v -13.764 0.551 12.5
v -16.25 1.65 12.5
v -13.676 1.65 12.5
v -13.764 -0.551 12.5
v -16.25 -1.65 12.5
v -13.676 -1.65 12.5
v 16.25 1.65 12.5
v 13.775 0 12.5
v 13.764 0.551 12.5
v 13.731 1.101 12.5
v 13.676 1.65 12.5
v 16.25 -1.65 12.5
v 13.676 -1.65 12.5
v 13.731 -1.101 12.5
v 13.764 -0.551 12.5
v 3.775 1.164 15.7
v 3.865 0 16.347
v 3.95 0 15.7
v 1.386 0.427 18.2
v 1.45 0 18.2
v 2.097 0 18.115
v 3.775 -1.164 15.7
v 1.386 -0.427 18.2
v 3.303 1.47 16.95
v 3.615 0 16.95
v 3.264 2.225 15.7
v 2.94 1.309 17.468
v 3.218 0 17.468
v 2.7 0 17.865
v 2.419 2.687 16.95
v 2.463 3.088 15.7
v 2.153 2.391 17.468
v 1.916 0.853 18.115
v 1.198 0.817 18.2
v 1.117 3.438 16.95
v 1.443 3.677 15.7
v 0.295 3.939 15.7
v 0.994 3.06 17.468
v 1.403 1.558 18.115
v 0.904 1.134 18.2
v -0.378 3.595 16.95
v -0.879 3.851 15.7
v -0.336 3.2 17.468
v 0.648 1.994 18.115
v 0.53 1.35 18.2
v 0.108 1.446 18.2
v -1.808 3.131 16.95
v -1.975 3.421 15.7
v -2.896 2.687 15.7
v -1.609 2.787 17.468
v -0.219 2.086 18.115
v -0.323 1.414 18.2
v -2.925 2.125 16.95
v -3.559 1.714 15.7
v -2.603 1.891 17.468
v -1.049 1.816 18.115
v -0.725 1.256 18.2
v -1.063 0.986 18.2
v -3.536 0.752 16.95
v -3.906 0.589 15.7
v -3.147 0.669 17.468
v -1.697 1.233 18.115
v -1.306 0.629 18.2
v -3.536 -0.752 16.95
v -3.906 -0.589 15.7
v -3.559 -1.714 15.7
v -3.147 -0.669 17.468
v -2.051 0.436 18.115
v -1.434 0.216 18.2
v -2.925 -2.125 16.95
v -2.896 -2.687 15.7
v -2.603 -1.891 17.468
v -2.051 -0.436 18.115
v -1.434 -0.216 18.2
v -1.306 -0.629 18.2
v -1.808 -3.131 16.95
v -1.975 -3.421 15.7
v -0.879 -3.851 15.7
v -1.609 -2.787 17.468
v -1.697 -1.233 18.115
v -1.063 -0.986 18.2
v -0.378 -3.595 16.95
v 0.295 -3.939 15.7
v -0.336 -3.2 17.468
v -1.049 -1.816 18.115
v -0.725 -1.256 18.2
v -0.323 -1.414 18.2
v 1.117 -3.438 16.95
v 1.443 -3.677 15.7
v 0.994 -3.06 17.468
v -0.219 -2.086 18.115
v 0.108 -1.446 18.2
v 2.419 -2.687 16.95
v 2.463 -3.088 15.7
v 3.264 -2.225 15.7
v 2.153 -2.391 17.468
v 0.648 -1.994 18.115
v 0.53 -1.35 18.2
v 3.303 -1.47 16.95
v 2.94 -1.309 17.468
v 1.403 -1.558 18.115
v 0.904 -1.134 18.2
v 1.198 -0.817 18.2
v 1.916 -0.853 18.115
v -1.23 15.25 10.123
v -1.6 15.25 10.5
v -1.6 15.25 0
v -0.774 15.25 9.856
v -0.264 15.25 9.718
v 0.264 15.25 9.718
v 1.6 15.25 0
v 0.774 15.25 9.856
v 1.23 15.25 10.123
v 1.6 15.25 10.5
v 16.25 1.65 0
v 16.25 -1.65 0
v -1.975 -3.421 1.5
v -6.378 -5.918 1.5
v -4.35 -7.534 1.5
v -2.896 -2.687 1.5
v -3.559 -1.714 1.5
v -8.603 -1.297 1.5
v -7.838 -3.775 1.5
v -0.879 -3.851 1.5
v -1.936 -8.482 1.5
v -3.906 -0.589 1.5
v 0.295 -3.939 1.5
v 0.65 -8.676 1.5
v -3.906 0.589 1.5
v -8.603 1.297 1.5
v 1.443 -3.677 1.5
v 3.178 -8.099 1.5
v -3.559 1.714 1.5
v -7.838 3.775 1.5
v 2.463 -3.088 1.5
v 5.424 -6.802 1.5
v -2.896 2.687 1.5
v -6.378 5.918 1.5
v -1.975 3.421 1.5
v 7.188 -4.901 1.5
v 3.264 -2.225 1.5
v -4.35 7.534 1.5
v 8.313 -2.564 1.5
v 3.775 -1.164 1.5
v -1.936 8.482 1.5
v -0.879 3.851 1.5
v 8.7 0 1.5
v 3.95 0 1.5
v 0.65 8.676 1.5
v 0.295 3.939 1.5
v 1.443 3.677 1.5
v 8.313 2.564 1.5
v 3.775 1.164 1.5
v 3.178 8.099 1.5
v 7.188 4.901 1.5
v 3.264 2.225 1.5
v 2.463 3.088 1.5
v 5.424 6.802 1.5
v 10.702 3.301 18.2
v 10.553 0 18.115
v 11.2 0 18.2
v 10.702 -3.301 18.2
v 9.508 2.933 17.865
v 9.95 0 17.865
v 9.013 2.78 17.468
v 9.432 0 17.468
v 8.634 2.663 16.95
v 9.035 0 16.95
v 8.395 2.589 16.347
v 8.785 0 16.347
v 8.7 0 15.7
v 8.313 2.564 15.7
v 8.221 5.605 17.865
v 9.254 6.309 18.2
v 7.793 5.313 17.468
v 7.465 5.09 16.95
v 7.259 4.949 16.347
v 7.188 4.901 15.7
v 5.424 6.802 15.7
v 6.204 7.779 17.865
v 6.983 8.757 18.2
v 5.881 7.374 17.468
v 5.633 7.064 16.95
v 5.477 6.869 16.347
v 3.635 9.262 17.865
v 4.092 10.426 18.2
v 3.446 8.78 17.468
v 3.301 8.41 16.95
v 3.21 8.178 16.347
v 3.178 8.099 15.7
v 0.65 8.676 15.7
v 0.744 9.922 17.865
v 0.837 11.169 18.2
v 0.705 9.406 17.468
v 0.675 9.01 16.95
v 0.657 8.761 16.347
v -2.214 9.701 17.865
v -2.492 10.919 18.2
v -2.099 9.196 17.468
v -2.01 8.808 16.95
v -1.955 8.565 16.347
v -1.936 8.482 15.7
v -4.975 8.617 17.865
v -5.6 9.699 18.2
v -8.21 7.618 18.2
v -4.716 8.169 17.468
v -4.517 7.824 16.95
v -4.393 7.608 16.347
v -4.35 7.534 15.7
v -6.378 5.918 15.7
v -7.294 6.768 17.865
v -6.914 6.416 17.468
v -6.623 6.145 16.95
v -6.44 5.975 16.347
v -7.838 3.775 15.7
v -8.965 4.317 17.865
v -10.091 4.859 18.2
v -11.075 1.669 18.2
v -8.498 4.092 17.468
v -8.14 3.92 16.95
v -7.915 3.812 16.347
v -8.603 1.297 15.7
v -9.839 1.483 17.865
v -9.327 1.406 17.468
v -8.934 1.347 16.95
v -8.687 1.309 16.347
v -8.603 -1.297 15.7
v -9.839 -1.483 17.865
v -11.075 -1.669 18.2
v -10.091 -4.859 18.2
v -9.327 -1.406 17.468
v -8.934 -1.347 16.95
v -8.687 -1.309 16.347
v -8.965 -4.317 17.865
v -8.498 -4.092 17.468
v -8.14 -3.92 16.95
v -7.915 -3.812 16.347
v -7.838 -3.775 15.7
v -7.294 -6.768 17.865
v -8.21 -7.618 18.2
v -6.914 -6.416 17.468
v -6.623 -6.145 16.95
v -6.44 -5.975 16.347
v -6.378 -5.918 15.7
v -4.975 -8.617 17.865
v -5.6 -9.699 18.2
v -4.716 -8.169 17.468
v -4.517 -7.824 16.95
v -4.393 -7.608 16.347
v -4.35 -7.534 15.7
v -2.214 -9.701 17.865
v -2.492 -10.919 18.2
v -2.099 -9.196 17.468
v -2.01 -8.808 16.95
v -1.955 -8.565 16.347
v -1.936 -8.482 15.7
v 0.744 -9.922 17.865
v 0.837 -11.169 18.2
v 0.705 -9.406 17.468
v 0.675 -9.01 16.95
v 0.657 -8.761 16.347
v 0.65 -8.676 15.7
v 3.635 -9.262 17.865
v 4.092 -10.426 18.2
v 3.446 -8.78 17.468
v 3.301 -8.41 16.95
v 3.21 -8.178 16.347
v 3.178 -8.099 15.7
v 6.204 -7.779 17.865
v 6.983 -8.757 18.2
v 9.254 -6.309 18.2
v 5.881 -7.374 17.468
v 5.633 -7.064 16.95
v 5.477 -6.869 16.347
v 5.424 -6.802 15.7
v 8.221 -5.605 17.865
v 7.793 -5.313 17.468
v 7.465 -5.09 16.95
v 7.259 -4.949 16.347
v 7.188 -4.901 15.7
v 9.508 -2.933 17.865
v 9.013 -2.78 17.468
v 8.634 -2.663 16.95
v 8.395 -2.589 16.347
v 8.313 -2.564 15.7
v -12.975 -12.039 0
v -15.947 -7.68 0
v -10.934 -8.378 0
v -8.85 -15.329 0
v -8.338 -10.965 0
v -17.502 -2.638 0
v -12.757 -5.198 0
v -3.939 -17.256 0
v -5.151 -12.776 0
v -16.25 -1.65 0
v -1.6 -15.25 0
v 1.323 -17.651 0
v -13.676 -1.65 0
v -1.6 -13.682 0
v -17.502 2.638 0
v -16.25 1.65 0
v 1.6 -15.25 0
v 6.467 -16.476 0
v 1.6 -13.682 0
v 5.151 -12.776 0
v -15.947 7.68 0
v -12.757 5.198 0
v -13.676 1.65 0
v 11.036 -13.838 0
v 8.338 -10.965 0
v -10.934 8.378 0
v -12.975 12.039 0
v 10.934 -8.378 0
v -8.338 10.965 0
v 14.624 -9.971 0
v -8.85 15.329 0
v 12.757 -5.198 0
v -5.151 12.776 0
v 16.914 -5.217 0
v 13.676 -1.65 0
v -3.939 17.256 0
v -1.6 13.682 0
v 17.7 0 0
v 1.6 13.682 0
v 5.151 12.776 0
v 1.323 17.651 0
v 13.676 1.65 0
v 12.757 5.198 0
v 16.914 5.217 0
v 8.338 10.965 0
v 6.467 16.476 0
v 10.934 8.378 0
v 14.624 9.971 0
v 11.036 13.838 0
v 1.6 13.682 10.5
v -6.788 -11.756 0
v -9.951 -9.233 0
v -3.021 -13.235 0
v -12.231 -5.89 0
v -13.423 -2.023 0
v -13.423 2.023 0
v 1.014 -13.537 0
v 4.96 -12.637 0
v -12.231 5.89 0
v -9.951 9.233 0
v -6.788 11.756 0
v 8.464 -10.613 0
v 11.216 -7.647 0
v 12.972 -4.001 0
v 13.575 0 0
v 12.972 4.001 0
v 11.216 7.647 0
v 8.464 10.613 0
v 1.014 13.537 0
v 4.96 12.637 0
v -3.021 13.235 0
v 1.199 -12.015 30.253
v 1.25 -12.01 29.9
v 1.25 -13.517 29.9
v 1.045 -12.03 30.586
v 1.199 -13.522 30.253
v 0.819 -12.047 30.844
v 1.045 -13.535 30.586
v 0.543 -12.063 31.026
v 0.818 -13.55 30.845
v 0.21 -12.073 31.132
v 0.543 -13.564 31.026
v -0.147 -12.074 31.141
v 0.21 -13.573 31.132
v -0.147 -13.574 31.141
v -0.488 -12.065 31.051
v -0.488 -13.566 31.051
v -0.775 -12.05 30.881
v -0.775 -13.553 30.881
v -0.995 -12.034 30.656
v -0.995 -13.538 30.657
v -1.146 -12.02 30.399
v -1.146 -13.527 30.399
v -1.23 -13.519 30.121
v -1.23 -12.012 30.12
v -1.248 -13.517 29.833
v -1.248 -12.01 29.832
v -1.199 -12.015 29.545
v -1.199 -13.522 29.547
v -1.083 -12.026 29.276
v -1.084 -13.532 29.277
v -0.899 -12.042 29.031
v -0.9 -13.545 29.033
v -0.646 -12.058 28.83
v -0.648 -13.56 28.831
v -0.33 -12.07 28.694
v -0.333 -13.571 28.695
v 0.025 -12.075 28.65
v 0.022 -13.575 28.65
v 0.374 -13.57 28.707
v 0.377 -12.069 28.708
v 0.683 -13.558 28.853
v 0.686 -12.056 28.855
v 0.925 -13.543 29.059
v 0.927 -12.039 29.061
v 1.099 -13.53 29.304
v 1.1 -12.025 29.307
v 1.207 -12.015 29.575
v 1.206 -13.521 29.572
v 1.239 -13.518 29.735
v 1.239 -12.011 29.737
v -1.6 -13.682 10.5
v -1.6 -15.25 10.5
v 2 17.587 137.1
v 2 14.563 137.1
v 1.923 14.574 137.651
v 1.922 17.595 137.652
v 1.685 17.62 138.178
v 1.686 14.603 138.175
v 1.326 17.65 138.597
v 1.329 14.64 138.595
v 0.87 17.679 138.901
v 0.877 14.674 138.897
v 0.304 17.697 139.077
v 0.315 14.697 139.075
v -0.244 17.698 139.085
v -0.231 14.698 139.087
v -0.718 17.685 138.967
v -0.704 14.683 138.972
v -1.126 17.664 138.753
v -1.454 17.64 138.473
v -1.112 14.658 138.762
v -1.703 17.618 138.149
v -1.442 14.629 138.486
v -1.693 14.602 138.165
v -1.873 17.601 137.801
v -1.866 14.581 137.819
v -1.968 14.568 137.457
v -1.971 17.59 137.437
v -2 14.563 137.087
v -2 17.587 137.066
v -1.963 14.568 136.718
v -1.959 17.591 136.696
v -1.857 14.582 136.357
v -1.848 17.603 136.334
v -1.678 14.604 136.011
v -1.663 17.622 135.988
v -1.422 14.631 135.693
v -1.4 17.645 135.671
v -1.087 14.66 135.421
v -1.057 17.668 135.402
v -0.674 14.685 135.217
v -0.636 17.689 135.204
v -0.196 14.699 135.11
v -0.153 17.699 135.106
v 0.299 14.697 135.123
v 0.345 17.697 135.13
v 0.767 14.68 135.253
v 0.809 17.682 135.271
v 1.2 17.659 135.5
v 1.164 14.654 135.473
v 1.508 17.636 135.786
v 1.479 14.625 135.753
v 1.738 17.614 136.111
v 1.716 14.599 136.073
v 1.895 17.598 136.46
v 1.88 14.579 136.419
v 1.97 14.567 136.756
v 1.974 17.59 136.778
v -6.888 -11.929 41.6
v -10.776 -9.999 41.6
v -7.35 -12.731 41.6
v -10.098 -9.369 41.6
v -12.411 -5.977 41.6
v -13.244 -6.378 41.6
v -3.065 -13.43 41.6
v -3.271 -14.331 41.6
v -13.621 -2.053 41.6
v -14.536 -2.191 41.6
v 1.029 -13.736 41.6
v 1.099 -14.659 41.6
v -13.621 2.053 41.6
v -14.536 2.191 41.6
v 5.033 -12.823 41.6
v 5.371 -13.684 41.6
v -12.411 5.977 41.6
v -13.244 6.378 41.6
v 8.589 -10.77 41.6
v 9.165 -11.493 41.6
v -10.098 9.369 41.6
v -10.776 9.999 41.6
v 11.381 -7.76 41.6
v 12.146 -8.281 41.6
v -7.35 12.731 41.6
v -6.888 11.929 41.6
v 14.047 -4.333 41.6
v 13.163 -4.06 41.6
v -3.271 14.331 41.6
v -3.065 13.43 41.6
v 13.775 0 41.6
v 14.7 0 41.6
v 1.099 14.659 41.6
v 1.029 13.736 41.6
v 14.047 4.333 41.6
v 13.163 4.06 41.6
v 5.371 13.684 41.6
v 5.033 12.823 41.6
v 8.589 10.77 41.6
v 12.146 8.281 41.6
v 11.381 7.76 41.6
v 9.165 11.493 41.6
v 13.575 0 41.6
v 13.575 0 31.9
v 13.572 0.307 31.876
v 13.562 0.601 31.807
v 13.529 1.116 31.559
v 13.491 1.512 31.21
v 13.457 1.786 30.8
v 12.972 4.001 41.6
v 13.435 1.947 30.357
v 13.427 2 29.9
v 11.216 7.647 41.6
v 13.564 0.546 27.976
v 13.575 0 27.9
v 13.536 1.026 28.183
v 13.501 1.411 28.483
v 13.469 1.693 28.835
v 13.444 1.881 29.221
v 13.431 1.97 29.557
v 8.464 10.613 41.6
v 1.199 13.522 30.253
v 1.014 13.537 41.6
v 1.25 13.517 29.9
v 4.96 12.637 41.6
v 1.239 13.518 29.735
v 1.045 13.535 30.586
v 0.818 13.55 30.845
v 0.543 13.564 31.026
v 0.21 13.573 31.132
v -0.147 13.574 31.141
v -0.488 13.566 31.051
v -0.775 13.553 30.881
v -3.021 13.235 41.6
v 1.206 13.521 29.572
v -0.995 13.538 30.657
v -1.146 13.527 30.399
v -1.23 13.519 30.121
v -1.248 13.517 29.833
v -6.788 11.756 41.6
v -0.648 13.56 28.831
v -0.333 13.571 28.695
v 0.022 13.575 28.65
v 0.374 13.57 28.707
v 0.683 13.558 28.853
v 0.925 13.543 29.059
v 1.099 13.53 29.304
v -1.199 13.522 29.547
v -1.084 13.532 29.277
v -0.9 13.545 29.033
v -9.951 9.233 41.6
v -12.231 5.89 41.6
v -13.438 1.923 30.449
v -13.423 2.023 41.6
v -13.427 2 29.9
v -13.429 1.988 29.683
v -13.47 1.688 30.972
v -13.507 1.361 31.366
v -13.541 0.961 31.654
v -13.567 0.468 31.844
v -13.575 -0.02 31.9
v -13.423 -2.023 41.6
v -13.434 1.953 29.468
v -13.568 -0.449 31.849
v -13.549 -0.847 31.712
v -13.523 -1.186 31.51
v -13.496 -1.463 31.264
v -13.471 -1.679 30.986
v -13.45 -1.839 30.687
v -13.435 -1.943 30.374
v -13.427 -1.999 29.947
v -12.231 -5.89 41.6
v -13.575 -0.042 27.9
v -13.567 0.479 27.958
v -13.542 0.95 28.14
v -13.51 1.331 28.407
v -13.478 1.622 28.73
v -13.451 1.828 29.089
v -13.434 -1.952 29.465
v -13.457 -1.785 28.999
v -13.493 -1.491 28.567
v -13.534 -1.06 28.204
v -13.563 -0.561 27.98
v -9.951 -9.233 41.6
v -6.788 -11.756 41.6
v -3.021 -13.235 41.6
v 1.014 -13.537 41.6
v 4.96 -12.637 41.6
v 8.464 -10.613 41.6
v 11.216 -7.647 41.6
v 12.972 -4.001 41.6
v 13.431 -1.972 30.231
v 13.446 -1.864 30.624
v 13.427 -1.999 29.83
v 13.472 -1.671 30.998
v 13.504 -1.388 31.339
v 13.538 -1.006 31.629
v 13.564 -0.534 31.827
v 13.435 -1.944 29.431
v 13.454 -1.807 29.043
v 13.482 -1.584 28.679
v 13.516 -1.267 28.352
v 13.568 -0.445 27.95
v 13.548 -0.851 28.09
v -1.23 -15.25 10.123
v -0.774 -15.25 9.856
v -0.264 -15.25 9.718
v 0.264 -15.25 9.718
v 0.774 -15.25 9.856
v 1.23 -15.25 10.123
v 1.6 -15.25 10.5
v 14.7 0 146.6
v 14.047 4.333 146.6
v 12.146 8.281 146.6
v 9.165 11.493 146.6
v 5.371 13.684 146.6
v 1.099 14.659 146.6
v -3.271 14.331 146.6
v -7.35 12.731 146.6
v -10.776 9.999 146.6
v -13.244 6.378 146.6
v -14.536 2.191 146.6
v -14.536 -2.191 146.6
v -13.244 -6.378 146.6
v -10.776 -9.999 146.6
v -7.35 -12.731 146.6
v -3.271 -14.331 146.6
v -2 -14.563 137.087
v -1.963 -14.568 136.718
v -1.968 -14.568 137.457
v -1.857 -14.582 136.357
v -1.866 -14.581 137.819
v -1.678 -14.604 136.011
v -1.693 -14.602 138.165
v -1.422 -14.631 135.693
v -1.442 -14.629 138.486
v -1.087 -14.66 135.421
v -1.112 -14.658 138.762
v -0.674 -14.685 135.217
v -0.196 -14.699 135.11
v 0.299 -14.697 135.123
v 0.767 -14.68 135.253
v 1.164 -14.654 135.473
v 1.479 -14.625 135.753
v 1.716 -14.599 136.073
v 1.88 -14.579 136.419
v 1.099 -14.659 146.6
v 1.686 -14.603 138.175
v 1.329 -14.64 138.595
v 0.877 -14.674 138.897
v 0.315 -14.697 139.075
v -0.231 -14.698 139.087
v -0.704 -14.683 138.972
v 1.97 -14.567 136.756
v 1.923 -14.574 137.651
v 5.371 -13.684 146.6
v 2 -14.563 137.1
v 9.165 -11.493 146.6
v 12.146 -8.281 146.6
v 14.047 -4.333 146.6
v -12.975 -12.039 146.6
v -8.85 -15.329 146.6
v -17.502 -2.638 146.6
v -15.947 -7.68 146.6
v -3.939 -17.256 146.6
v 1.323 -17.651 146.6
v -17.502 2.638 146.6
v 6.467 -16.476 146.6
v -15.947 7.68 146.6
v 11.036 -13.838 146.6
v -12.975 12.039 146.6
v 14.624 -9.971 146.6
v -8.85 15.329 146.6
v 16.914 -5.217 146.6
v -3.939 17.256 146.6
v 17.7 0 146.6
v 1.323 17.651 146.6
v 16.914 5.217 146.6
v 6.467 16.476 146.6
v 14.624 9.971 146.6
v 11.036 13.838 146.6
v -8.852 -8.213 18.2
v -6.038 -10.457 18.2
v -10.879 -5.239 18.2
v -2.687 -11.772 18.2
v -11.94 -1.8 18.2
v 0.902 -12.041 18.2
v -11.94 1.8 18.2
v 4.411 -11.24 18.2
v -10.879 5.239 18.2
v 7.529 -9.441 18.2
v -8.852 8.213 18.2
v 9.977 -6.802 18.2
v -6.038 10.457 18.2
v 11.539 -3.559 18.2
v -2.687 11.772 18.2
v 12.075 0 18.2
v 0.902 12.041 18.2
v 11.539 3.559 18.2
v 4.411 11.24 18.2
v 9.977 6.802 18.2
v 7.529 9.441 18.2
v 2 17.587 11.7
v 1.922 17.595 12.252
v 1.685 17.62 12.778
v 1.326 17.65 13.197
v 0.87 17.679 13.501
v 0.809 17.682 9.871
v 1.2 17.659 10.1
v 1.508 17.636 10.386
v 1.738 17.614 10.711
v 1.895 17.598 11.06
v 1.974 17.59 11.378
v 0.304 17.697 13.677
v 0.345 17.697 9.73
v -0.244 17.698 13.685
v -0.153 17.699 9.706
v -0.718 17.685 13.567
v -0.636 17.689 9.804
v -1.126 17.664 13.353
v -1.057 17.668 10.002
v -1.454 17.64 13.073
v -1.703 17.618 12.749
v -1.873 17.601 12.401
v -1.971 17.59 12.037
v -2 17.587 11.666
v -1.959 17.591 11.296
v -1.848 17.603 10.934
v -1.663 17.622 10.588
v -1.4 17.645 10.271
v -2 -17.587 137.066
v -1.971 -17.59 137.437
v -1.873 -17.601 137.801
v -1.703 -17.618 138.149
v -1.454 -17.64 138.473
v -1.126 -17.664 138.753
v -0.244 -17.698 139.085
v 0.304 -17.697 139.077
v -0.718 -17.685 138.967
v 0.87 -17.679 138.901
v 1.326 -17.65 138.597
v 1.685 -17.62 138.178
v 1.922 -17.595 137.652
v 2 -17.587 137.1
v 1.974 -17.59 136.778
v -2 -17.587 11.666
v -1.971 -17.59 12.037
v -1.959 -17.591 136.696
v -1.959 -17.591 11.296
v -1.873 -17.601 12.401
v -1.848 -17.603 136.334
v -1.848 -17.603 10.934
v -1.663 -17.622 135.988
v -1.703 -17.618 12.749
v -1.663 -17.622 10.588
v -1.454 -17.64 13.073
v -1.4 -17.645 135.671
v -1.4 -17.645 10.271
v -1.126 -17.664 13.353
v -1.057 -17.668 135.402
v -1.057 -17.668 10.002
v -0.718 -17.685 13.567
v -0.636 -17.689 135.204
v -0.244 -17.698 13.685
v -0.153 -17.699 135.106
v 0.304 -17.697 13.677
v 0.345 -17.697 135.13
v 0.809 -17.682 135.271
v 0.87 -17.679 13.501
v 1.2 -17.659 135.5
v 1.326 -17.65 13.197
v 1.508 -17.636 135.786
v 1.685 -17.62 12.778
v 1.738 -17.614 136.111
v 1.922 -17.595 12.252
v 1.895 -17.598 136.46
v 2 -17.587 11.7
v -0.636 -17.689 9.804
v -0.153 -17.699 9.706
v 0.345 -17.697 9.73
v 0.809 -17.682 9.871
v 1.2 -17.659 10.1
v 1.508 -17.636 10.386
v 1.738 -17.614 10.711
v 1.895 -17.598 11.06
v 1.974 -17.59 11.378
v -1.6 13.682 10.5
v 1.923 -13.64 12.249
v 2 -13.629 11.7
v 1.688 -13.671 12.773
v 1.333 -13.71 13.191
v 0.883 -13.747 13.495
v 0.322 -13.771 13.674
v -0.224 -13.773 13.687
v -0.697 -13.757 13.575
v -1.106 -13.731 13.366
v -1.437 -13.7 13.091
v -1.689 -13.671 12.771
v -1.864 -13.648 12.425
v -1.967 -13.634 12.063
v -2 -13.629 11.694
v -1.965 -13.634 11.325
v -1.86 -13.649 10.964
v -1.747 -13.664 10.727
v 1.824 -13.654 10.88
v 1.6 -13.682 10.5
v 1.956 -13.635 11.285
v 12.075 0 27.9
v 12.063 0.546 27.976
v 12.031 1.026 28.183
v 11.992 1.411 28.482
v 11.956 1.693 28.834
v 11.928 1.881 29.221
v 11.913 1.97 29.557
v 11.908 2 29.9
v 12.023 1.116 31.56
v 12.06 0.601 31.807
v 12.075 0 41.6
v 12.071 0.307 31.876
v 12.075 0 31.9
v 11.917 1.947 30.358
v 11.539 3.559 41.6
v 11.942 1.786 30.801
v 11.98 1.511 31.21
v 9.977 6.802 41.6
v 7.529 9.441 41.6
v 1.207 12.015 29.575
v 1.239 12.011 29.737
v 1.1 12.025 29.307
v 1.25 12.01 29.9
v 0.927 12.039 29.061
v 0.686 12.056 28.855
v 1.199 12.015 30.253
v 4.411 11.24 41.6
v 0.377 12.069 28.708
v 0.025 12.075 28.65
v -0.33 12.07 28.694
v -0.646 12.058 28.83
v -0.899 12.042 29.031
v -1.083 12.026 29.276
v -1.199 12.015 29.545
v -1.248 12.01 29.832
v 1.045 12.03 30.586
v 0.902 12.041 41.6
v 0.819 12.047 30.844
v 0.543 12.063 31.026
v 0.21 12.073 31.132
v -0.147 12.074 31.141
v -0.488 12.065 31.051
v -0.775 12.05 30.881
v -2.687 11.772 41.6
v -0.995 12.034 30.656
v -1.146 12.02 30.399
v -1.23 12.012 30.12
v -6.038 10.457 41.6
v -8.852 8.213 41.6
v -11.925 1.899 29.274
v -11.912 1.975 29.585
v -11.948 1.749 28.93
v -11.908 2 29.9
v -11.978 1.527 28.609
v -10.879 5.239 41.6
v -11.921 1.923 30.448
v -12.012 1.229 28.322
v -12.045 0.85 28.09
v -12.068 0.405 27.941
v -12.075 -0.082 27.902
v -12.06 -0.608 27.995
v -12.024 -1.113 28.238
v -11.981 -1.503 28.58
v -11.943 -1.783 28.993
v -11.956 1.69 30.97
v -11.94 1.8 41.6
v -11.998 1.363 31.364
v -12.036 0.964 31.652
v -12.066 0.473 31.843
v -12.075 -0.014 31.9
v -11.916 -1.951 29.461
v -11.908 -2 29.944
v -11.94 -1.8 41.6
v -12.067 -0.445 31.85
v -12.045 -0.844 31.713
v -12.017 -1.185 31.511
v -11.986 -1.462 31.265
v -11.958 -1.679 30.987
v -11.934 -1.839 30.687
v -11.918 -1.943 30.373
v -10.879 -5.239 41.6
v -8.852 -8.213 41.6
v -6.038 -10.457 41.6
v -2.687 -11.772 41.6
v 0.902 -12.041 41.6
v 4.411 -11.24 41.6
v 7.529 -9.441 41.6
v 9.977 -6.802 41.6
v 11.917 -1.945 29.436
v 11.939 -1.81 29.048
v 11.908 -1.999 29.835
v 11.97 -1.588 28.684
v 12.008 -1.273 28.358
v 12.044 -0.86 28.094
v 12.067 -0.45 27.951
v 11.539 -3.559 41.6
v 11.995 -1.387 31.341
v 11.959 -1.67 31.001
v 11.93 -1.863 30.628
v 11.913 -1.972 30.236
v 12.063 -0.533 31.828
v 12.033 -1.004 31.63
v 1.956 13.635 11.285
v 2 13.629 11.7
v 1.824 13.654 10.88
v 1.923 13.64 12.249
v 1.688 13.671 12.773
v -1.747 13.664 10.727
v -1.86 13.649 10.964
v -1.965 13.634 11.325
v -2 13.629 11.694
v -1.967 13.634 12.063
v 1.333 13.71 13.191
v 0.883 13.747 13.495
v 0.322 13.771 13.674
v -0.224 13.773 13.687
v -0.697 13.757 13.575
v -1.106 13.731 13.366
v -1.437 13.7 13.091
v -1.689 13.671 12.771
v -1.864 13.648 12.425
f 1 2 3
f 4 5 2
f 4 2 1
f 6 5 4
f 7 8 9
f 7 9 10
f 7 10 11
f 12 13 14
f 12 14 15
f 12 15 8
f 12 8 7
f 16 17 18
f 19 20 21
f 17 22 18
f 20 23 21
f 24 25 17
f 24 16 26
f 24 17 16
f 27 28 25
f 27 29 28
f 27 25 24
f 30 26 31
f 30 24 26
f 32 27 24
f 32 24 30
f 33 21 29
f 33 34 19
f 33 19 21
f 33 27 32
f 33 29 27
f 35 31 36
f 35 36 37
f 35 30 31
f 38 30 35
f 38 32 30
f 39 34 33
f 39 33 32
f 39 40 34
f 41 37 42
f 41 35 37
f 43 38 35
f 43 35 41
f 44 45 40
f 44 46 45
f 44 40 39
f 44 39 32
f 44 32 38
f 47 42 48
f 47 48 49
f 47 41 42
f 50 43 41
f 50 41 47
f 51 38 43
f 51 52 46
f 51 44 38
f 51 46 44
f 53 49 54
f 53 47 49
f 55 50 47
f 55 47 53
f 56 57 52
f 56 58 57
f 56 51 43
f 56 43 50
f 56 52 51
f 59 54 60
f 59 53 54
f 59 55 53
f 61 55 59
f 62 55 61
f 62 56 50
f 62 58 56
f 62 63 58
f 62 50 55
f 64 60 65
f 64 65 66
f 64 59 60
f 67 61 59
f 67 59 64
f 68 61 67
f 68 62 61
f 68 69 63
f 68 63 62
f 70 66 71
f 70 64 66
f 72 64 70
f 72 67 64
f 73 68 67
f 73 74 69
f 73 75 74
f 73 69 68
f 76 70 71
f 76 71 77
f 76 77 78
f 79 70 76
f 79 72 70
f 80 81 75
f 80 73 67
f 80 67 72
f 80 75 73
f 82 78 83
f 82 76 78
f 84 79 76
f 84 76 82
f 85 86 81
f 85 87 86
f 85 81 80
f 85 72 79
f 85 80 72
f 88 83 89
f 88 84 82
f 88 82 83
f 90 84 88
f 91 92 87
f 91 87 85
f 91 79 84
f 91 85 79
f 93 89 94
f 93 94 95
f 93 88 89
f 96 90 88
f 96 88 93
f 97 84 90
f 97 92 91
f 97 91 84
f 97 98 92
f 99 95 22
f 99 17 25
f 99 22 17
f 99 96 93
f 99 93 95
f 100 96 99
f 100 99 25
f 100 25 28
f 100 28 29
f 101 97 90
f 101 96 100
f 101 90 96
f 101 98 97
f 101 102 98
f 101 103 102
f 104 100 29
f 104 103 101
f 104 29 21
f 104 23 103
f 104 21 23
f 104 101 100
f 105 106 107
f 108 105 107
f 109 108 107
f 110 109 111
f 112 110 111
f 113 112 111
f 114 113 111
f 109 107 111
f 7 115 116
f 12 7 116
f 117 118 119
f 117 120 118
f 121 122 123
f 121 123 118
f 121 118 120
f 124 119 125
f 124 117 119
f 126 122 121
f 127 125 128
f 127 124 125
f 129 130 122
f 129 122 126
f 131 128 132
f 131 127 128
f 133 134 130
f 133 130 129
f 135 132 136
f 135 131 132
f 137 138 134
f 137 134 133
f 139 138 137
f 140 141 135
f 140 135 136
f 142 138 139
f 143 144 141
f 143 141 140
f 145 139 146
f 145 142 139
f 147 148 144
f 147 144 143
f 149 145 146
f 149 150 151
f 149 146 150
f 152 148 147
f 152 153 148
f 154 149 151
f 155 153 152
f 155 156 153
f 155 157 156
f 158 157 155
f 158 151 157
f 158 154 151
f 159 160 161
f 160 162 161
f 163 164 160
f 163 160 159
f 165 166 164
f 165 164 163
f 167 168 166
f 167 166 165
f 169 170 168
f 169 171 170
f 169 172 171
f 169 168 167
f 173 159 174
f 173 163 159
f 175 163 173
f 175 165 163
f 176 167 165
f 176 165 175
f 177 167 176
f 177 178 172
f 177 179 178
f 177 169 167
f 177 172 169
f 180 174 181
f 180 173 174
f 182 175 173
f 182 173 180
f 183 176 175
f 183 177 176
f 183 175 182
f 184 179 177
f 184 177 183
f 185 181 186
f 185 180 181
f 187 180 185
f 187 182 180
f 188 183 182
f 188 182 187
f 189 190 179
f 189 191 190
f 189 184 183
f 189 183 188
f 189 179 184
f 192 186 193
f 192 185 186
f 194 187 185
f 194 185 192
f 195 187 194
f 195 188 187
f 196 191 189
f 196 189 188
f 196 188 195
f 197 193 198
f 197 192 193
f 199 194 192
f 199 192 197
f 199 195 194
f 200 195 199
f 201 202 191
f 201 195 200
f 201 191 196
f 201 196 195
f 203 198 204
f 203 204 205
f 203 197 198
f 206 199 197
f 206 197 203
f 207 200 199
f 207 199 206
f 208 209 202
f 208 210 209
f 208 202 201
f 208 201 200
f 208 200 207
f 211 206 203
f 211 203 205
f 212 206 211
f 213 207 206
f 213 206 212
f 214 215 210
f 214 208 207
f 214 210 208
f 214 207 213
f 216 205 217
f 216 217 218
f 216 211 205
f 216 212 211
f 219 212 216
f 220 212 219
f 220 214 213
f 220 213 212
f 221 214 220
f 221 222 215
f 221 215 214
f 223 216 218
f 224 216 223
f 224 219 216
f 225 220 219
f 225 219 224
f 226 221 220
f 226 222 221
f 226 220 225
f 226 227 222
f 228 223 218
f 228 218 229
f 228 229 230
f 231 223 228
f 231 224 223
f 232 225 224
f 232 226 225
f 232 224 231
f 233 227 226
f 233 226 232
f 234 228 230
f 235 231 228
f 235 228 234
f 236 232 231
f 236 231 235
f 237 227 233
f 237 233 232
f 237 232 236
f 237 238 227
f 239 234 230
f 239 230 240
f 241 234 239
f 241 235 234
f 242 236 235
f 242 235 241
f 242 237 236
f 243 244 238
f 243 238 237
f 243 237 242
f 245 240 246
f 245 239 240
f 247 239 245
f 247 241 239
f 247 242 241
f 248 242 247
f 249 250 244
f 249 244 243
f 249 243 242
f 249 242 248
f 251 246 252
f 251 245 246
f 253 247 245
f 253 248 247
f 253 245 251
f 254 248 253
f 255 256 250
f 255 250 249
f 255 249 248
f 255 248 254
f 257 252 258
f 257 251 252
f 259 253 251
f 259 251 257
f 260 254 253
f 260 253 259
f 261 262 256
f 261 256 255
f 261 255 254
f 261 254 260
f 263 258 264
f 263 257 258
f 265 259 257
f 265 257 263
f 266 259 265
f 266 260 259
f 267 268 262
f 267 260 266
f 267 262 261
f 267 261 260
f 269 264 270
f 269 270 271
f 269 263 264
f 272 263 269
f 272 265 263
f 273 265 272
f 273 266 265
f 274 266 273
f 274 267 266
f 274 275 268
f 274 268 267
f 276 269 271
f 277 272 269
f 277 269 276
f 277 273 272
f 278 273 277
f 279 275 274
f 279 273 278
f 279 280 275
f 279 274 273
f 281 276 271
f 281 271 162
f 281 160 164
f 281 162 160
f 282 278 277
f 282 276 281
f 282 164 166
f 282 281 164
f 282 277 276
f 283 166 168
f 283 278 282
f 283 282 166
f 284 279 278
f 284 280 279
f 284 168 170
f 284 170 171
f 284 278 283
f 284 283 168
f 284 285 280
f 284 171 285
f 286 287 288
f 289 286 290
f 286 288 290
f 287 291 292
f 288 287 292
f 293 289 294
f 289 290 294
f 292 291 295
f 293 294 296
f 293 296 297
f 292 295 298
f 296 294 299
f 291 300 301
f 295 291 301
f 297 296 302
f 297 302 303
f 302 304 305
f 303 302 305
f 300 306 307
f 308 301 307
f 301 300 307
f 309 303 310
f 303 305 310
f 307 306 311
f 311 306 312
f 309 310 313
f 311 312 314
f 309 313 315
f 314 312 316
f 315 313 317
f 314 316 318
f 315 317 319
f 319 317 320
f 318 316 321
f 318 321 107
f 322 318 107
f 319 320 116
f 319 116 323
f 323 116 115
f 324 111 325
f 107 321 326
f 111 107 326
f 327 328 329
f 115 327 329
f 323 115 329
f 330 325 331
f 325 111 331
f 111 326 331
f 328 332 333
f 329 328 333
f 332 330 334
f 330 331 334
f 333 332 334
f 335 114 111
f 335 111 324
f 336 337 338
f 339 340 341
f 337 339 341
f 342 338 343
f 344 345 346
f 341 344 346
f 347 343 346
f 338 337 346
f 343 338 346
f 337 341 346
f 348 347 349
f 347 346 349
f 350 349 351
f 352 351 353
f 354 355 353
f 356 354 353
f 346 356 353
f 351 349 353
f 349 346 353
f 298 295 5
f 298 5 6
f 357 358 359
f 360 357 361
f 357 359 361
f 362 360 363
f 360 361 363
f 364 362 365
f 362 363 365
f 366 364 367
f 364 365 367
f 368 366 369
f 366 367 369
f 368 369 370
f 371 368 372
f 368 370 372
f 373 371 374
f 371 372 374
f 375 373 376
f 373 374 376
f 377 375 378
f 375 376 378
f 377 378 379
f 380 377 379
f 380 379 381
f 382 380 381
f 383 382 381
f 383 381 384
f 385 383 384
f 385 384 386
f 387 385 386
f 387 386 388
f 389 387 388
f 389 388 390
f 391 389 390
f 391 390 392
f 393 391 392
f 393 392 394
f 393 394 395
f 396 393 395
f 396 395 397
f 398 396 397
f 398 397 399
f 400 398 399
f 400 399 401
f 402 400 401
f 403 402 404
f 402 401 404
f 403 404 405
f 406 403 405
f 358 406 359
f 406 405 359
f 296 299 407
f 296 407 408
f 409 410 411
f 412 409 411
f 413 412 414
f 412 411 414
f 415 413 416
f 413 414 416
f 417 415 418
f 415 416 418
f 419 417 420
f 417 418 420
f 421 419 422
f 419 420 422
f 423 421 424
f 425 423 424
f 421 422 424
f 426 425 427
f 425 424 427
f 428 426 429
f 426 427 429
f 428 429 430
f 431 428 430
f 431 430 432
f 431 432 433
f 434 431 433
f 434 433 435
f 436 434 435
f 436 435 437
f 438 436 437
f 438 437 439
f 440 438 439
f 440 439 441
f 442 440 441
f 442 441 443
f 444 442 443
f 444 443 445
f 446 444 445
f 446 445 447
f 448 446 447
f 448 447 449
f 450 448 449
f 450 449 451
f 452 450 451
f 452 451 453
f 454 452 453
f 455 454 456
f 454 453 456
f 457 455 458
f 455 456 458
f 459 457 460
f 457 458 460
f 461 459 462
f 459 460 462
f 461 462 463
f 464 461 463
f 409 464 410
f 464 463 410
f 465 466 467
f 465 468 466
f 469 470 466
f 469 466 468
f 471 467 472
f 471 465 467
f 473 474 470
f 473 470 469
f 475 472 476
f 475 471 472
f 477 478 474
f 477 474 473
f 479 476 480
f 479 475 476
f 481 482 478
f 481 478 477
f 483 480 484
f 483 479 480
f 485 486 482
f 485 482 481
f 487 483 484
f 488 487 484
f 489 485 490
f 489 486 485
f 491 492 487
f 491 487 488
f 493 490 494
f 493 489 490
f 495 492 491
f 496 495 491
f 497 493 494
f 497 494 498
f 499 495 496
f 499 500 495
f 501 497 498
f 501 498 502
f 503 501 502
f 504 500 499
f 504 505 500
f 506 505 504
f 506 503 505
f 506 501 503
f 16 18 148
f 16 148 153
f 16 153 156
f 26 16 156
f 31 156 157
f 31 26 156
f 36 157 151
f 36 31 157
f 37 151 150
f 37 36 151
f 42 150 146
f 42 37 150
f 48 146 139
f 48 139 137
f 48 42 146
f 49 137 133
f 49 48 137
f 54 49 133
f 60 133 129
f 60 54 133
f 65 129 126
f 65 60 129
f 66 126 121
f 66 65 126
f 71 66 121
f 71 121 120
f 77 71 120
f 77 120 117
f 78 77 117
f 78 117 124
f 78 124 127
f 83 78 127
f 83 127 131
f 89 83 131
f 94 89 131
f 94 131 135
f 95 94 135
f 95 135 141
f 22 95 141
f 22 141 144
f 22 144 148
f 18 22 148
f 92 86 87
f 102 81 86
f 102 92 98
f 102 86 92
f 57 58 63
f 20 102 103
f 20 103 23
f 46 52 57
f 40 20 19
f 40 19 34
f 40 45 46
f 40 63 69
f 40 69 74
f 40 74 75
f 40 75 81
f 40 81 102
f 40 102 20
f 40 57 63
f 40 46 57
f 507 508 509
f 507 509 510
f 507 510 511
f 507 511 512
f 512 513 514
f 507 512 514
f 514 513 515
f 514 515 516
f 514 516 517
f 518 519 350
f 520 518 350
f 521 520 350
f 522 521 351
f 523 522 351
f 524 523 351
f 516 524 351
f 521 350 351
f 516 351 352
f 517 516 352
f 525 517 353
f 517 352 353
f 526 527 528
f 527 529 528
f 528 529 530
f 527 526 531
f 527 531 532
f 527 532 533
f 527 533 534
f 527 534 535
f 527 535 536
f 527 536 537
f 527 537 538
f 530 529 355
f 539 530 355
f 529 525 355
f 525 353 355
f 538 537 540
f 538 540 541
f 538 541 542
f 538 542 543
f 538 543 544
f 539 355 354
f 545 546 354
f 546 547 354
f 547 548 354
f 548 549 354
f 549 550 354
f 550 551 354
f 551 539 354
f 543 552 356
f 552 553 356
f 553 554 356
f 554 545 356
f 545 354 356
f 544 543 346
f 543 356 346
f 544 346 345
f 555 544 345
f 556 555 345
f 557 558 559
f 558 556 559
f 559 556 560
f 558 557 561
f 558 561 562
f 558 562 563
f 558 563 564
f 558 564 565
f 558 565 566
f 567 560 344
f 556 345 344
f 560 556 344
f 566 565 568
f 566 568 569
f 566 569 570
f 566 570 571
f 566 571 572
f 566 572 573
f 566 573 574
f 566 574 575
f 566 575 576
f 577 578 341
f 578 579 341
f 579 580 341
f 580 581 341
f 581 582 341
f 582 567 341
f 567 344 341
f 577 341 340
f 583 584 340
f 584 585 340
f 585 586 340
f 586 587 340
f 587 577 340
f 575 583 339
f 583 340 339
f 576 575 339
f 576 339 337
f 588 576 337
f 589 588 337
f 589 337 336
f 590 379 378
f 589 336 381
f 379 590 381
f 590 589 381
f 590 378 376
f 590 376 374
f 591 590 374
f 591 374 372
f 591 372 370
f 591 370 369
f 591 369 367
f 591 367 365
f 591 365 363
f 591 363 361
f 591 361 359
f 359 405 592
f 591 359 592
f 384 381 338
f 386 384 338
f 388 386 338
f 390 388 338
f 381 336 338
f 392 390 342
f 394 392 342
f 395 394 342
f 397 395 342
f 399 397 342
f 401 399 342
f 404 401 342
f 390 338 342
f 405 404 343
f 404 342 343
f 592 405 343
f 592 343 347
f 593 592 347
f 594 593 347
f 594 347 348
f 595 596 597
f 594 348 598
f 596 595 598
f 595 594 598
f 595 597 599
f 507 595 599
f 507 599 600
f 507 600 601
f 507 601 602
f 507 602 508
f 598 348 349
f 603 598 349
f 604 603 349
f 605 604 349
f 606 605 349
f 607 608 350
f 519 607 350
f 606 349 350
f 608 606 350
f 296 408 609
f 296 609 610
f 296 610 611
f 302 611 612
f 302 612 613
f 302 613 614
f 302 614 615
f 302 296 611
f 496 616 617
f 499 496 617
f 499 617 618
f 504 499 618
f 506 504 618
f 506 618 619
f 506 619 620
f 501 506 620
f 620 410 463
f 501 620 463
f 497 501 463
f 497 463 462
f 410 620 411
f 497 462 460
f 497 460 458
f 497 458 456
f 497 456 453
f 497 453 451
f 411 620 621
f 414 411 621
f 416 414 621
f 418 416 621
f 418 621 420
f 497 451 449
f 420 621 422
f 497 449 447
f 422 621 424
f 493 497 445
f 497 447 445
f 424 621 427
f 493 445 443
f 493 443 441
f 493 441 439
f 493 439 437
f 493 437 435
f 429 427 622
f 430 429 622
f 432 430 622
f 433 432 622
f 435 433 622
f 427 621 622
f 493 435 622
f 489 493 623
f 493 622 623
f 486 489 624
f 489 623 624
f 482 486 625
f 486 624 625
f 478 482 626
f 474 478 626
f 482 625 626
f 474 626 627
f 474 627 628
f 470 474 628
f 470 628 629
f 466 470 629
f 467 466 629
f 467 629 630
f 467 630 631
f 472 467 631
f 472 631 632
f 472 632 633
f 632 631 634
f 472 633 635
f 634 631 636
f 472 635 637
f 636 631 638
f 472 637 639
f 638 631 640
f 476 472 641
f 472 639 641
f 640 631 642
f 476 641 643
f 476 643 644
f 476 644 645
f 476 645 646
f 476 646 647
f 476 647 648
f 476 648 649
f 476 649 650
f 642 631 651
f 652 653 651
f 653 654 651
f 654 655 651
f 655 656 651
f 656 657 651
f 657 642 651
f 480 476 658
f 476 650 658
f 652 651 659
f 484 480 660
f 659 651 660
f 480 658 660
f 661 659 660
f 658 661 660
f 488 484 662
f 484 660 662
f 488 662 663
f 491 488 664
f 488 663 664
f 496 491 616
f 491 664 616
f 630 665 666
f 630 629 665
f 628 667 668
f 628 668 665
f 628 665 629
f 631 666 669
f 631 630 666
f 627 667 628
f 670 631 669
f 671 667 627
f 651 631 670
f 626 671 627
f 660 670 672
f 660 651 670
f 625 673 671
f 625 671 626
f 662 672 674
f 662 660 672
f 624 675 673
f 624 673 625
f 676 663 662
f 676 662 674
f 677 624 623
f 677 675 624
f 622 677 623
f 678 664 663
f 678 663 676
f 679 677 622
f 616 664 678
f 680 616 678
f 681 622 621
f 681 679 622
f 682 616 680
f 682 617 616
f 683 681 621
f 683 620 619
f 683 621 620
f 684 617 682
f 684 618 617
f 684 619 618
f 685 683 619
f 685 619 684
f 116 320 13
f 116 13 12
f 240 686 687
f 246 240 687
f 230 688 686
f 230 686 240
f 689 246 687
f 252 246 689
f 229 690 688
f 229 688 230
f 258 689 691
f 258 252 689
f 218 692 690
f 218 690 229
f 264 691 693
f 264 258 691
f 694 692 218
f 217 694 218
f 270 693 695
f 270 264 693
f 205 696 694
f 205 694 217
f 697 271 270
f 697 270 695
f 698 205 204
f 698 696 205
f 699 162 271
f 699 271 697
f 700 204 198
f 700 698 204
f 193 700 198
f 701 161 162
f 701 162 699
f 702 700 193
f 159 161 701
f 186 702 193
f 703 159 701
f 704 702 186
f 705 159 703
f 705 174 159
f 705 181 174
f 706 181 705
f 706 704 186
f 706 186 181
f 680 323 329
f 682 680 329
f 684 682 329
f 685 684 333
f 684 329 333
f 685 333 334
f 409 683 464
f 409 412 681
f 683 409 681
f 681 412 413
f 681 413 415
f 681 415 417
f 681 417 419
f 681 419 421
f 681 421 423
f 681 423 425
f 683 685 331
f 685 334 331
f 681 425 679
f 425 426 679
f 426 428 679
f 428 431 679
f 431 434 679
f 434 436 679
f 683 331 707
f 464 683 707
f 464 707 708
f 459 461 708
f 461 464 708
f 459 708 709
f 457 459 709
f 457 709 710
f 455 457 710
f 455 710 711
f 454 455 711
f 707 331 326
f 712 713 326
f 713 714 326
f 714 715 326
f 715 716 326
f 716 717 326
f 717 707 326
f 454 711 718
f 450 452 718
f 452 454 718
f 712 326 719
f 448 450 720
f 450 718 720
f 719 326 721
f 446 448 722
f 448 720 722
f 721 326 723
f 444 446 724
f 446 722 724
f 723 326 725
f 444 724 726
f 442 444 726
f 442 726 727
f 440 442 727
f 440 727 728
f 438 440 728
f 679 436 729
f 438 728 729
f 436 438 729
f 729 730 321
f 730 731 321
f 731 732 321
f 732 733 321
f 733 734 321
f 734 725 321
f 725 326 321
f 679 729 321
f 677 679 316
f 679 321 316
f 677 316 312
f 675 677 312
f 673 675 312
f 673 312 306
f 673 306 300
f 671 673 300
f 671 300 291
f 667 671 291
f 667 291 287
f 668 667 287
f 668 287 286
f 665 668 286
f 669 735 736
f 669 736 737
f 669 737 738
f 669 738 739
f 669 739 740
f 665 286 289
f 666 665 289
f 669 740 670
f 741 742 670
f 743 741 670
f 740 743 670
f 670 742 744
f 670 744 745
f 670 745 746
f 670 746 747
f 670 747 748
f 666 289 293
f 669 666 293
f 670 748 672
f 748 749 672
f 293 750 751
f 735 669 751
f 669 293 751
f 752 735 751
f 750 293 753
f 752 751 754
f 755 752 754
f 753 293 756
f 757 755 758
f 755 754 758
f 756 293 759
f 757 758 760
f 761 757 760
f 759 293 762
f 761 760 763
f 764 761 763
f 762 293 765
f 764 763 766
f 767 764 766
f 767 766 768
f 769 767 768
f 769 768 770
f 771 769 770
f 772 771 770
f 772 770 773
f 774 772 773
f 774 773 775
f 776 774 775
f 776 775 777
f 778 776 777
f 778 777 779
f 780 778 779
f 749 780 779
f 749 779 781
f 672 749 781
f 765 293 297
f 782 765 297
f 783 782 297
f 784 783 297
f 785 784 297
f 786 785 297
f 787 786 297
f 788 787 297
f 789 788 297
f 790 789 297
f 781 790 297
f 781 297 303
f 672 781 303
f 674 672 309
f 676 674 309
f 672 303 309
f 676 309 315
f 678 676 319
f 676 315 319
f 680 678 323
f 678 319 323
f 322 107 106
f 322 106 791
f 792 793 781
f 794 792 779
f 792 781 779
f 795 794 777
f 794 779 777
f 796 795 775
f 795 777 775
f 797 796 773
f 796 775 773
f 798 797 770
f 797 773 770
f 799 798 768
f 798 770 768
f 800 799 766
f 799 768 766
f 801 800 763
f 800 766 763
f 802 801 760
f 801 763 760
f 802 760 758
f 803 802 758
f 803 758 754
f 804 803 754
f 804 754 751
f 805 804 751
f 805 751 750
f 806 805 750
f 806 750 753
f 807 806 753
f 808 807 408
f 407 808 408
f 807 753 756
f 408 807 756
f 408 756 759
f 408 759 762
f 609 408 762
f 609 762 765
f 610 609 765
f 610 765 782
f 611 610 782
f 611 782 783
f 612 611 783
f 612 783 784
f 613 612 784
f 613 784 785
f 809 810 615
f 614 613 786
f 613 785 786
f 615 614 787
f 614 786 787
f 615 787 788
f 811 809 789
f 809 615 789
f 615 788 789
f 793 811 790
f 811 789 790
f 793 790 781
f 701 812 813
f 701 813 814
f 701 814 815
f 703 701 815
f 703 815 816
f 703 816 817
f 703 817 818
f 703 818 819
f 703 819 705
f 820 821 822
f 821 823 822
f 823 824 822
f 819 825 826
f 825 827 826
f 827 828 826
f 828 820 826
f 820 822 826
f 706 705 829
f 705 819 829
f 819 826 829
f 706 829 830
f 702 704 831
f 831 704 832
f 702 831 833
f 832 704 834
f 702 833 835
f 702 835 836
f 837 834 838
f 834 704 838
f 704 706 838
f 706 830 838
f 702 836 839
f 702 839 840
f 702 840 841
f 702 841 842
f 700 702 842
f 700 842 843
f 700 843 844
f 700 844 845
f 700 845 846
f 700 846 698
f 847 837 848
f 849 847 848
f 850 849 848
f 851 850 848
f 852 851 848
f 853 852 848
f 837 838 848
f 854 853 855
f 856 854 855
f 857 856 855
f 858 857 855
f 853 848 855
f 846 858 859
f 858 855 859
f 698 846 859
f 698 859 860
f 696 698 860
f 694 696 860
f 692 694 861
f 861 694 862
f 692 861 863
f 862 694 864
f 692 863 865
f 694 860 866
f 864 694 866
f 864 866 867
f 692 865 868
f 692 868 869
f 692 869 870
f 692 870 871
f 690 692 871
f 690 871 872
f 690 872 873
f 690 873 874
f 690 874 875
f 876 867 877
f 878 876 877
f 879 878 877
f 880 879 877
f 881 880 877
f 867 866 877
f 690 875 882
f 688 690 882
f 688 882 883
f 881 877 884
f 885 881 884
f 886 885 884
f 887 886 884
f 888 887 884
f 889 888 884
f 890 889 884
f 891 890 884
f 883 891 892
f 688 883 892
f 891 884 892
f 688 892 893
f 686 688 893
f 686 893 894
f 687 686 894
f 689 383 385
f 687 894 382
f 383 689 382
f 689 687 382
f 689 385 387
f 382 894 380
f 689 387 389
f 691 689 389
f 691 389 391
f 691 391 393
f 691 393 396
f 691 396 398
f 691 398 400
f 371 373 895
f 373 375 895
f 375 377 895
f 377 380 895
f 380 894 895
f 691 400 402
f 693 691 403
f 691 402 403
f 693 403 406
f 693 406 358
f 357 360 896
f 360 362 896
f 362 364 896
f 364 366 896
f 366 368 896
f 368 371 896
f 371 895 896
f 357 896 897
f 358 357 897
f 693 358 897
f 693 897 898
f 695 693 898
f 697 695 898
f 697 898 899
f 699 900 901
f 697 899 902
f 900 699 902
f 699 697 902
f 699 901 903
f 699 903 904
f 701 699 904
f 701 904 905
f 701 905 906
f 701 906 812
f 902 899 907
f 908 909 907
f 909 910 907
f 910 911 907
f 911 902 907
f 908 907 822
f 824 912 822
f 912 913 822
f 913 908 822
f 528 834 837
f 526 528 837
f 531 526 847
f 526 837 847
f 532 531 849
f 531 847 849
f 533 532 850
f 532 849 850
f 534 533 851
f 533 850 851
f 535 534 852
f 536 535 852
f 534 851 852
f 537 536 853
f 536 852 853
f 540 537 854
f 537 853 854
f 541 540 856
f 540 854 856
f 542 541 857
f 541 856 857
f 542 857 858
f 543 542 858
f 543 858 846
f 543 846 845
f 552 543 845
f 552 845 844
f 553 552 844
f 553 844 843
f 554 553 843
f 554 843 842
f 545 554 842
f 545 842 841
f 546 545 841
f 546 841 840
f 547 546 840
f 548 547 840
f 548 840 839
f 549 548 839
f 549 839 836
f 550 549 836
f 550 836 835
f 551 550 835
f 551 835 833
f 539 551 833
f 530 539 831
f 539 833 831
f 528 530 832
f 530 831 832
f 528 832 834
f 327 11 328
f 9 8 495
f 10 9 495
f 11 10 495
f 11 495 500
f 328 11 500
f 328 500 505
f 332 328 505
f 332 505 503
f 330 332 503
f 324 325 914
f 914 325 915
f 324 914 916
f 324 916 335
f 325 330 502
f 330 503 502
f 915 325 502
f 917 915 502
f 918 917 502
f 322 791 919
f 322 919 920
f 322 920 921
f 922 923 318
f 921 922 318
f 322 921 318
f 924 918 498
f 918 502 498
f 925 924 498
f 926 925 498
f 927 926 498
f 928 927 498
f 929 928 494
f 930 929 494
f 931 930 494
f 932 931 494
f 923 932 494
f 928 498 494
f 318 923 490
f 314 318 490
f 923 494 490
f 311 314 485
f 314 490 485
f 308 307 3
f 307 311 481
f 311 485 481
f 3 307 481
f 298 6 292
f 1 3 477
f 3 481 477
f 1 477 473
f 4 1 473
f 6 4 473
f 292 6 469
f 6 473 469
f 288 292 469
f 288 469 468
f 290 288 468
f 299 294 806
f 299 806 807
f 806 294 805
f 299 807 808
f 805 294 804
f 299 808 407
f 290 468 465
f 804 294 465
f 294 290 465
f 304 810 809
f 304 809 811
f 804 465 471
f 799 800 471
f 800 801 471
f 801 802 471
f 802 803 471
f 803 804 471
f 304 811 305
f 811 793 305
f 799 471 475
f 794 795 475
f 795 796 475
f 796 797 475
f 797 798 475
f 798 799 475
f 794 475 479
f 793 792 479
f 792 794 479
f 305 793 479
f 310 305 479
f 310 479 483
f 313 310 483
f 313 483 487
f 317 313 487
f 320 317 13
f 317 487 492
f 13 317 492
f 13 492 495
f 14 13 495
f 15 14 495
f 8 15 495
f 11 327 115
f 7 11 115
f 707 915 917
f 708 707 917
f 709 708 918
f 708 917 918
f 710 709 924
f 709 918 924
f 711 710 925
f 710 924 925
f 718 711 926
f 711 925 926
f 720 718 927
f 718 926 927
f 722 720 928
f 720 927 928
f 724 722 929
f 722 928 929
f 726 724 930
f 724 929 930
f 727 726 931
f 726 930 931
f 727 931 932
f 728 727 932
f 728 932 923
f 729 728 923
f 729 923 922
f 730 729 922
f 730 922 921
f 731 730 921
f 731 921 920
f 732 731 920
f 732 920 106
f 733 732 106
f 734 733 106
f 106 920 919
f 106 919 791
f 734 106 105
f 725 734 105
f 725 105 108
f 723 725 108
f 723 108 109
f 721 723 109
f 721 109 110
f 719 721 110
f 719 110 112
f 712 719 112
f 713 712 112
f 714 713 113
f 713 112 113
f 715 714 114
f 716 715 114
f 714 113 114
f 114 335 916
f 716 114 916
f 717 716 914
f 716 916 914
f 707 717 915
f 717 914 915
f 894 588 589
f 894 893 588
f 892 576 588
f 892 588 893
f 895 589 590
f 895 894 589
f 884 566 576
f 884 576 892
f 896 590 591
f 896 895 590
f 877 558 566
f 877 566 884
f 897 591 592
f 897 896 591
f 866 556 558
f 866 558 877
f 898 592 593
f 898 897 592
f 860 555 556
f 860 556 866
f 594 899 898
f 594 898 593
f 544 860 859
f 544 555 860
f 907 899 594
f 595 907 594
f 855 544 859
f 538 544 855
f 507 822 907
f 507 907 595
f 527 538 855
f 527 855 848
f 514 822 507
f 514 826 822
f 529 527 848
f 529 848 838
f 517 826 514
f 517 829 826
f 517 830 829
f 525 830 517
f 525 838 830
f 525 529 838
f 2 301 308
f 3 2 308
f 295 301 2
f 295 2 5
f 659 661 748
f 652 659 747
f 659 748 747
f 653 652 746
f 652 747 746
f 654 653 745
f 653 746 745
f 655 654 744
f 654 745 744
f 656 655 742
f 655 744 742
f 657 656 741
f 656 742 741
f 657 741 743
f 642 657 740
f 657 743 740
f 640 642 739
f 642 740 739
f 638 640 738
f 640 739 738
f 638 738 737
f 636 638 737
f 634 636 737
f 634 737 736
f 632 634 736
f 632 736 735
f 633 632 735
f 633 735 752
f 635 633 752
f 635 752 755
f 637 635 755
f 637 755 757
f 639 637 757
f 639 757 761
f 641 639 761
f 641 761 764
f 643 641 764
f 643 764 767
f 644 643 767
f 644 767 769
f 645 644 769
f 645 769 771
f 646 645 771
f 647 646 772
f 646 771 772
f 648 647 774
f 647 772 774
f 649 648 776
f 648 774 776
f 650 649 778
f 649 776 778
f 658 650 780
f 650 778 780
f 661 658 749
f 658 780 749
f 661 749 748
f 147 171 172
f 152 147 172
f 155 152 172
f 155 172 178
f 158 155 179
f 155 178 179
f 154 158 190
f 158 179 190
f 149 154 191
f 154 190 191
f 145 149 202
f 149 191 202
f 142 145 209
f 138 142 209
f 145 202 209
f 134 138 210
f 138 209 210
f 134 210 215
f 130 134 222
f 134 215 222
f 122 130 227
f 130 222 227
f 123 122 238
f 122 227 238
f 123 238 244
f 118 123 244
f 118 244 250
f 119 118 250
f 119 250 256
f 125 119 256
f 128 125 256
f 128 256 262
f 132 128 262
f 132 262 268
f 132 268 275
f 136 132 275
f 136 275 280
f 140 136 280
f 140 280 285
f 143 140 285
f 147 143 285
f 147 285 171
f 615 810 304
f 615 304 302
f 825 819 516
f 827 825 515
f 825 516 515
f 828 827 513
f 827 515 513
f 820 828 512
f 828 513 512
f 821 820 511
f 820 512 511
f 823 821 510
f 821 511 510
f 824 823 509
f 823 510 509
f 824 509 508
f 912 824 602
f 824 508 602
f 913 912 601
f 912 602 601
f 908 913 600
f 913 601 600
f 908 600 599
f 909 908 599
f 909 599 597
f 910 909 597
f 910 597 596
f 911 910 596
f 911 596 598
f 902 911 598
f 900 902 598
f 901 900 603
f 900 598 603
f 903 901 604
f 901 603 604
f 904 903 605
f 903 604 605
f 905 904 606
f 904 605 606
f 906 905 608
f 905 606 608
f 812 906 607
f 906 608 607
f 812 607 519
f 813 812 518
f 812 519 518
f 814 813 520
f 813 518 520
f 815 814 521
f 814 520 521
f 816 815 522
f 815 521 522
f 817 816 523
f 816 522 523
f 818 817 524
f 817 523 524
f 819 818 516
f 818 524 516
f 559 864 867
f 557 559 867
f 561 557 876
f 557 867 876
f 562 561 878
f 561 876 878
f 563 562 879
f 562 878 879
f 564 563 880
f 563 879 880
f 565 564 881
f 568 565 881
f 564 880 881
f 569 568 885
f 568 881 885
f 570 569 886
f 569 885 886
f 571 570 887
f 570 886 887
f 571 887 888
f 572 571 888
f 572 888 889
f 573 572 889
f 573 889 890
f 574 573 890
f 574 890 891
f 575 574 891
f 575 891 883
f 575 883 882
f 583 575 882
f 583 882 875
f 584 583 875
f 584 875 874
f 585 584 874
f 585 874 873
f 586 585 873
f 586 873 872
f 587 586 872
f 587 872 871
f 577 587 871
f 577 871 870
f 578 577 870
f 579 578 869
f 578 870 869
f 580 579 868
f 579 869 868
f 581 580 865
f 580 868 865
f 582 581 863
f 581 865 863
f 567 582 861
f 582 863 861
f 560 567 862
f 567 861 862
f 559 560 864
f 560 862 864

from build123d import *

# Parameters (mm, degrees)
SKETCH_R        = 13.575
PAD_DEPTH       = 41.6
SKETCH001_R     = 8.7
SKETCH001_R_2   = 3.95
POCKET_DEPTH    = 40.1
SKETCH002_R     = 12.075
POCKET001_DEPTH = 23.4
FILLET_R        = 2.5
SKETCH003_W     = 30
SKETCH003_H     = 30
PAD001_DEPTH    = 2
SKETCH004_R     = 1.25
POCKET002_DEPTH = 30.001
SKETCH006_R     = 2
POCKET004_DEPTH = 30.001
SKETCH007_W     = 30
SKETCH007_H     = 30
POCKET005_DEPTH = 2
SKETCH008_R     = 17.7
PAD002_DEPTH    = 146.6
SKETCH009_R     = 13.775
POCKET006_DEPTH = 146.601
SKETCH010_R     = 14.7
POCKET007_DEPTH = 105
SKETCH011_W     = 36
SKETCH011_H     = 36
PAD003_DEPTH    = 2
SKETCH012_R     = 2
POCKET008_DEPTH = 36.001
SKETCH013_W     = 36
SKETCH013_H     = 36
POCKET009_DEPTH = 2
SKETCH014_W     = 3.2
SKETCH014_H     = 30.5
SKETCH014_W_2   = 32.5
SKETCH014_H_2   = 3.3
POCKET010_DEPTH = 12.5


with BuildPart() as rdwhipitgoodwhipbody:
    # Sketch → Pad (new body)
    with BuildSketch(Plane.XY):
        Circle(SKETCH_R)
    extrude(amount=PAD_DEPTH)

    # Sketch001 (on Face3 of Pad) → Pocket (cut)
    with BuildSketch(Plane.XY.offset(41.6)):
        Circle(SKETCH001_R)
        Circle(SKETCH001_R_2, mode=Mode.SUBTRACT)
    extrude(amount=-POCKET_DEPTH, mode=Mode.SUBTRACT)

    # Sketch002 (on Face3 of Pocket) → Pocket001 (cut)
    with BuildSketch(Plane.XY.offset(41.6)):
        Circle(SKETCH002_R)
    extrude(amount=-POCKET001_DEPTH, mode=Mode.SUBTRACT)

    # Fillet
    fillet_edges = [rdwhipitgoodwhipbody.edges().sort_by_distance(p)[0] for p in [
        (-8.7, 0, 18.2),
        (-3.95, 0, 18.2),
    ]]
    fillet(fillet_edges, radius=FILLET_R)

    # Sketch003 (on Face5 of Fillet) → Pad001 (join)
    with BuildSketch(Plane.XY.offset(41.6)):
        Rectangle(SKETCH003_W, SKETCH003_H)
    extrude(amount=PAD001_DEPTH)

    # Sketch004 (on Face6 of Pad001) → Pocket002 (cut, through all)
    with BuildSketch(Plane.XZ.offset(15)):
        with Locations((0, 29.9)):
            Circle(SKETCH004_R)
    extrude(amount=-POCKET002_DEPTH, mode=Mode.SUBTRACT)

    # Sketch006 → Pocket004 (cut, through all)
    with BuildSketch(Plane.YZ.offset(15)):
        with Locations((0, 29.9)):
            Circle(SKETCH006_R)
    extrude(amount=-POCKET004_DEPTH, mode=Mode.SUBTRACT)

    # Sketch007 (on Face5 of Pocket004) → Pocket005 (cut)
    with BuildSketch(Plane.XY.offset(43.6)):
        Rectangle(SKETCH007_W, SKETCH007_H)
    extrude(amount=-POCKET005_DEPTH, mode=Mode.SUBTRACT)


with BuildPart() as rdwhipitgoodflashlightbody:
    # Sketch008 → Pad002 (new body)
    with BuildSketch(Plane.XY):
        Circle(SKETCH008_R)
    extrude(amount=PAD002_DEPTH)

    # Sketch009 (on Face3 of Pad002) → Pocket006 (cut, through all)
    with BuildSketch(Plane.XY.offset(146.6)):
        Circle(SKETCH009_R)
    extrude(amount=-POCKET006_DEPTH, mode=Mode.SUBTRACT)

    # Sketch010 (on Face3 of Pocket006) → Pocket007 (cut)
    with BuildSketch(Plane.XY.offset(146.6)):
        Circle(SKETCH010_R)
    extrude(amount=-POCKET007_DEPTH, mode=Mode.SUBTRACT)

    # Sketch011 (on Face3 of Pocket007) → Pad003 (join)
    with BuildSketch(Plane.XY.offset(146.6)):
        Rectangle(SKETCH011_W, SKETCH011_H)
    extrude(amount=PAD003_DEPTH)

    # Sketch012 (on Face6 of Pad003) → Pocket008 (cut, through all)
    with BuildSketch(Plane.XZ.offset(18)):
        with Locations((0, 11.7)):
            Circle(SKETCH012_R)
        with Locations((0, 137.1)):
            Circle(SKETCH012_R)
    extrude(amount=-POCKET008_DEPTH, mode=Mode.SUBTRACT)

    # Sketch013 (on Face5 of Pocket008) → Pocket009 (cut)
    with BuildSketch(Plane.XY.offset(148.6)):
        Rectangle(SKETCH013_W, SKETCH013_H)
    extrude(amount=-POCKET009_DEPTH, mode=Mode.SUBTRACT)

    # Sketch014 (on Face2 of Pocket009) → Pocket010 (cut)
    with BuildSketch(Plane(origin=(0, 0, 0), x_dir=(1, 0, 0), z_dir=(0, 0, -1))):
        Rectangle(SKETCH014_W, SKETCH014_H)
        Rectangle(SKETCH014_W_2, SKETCH014_H_2)
    extrude(amount=-POCKET010_DEPTH, mode=Mode.SUBTRACT)


solid = Compound([rdwhipitgoodwhipbody.part, rdwhipitgoodflashlightbody.part])
